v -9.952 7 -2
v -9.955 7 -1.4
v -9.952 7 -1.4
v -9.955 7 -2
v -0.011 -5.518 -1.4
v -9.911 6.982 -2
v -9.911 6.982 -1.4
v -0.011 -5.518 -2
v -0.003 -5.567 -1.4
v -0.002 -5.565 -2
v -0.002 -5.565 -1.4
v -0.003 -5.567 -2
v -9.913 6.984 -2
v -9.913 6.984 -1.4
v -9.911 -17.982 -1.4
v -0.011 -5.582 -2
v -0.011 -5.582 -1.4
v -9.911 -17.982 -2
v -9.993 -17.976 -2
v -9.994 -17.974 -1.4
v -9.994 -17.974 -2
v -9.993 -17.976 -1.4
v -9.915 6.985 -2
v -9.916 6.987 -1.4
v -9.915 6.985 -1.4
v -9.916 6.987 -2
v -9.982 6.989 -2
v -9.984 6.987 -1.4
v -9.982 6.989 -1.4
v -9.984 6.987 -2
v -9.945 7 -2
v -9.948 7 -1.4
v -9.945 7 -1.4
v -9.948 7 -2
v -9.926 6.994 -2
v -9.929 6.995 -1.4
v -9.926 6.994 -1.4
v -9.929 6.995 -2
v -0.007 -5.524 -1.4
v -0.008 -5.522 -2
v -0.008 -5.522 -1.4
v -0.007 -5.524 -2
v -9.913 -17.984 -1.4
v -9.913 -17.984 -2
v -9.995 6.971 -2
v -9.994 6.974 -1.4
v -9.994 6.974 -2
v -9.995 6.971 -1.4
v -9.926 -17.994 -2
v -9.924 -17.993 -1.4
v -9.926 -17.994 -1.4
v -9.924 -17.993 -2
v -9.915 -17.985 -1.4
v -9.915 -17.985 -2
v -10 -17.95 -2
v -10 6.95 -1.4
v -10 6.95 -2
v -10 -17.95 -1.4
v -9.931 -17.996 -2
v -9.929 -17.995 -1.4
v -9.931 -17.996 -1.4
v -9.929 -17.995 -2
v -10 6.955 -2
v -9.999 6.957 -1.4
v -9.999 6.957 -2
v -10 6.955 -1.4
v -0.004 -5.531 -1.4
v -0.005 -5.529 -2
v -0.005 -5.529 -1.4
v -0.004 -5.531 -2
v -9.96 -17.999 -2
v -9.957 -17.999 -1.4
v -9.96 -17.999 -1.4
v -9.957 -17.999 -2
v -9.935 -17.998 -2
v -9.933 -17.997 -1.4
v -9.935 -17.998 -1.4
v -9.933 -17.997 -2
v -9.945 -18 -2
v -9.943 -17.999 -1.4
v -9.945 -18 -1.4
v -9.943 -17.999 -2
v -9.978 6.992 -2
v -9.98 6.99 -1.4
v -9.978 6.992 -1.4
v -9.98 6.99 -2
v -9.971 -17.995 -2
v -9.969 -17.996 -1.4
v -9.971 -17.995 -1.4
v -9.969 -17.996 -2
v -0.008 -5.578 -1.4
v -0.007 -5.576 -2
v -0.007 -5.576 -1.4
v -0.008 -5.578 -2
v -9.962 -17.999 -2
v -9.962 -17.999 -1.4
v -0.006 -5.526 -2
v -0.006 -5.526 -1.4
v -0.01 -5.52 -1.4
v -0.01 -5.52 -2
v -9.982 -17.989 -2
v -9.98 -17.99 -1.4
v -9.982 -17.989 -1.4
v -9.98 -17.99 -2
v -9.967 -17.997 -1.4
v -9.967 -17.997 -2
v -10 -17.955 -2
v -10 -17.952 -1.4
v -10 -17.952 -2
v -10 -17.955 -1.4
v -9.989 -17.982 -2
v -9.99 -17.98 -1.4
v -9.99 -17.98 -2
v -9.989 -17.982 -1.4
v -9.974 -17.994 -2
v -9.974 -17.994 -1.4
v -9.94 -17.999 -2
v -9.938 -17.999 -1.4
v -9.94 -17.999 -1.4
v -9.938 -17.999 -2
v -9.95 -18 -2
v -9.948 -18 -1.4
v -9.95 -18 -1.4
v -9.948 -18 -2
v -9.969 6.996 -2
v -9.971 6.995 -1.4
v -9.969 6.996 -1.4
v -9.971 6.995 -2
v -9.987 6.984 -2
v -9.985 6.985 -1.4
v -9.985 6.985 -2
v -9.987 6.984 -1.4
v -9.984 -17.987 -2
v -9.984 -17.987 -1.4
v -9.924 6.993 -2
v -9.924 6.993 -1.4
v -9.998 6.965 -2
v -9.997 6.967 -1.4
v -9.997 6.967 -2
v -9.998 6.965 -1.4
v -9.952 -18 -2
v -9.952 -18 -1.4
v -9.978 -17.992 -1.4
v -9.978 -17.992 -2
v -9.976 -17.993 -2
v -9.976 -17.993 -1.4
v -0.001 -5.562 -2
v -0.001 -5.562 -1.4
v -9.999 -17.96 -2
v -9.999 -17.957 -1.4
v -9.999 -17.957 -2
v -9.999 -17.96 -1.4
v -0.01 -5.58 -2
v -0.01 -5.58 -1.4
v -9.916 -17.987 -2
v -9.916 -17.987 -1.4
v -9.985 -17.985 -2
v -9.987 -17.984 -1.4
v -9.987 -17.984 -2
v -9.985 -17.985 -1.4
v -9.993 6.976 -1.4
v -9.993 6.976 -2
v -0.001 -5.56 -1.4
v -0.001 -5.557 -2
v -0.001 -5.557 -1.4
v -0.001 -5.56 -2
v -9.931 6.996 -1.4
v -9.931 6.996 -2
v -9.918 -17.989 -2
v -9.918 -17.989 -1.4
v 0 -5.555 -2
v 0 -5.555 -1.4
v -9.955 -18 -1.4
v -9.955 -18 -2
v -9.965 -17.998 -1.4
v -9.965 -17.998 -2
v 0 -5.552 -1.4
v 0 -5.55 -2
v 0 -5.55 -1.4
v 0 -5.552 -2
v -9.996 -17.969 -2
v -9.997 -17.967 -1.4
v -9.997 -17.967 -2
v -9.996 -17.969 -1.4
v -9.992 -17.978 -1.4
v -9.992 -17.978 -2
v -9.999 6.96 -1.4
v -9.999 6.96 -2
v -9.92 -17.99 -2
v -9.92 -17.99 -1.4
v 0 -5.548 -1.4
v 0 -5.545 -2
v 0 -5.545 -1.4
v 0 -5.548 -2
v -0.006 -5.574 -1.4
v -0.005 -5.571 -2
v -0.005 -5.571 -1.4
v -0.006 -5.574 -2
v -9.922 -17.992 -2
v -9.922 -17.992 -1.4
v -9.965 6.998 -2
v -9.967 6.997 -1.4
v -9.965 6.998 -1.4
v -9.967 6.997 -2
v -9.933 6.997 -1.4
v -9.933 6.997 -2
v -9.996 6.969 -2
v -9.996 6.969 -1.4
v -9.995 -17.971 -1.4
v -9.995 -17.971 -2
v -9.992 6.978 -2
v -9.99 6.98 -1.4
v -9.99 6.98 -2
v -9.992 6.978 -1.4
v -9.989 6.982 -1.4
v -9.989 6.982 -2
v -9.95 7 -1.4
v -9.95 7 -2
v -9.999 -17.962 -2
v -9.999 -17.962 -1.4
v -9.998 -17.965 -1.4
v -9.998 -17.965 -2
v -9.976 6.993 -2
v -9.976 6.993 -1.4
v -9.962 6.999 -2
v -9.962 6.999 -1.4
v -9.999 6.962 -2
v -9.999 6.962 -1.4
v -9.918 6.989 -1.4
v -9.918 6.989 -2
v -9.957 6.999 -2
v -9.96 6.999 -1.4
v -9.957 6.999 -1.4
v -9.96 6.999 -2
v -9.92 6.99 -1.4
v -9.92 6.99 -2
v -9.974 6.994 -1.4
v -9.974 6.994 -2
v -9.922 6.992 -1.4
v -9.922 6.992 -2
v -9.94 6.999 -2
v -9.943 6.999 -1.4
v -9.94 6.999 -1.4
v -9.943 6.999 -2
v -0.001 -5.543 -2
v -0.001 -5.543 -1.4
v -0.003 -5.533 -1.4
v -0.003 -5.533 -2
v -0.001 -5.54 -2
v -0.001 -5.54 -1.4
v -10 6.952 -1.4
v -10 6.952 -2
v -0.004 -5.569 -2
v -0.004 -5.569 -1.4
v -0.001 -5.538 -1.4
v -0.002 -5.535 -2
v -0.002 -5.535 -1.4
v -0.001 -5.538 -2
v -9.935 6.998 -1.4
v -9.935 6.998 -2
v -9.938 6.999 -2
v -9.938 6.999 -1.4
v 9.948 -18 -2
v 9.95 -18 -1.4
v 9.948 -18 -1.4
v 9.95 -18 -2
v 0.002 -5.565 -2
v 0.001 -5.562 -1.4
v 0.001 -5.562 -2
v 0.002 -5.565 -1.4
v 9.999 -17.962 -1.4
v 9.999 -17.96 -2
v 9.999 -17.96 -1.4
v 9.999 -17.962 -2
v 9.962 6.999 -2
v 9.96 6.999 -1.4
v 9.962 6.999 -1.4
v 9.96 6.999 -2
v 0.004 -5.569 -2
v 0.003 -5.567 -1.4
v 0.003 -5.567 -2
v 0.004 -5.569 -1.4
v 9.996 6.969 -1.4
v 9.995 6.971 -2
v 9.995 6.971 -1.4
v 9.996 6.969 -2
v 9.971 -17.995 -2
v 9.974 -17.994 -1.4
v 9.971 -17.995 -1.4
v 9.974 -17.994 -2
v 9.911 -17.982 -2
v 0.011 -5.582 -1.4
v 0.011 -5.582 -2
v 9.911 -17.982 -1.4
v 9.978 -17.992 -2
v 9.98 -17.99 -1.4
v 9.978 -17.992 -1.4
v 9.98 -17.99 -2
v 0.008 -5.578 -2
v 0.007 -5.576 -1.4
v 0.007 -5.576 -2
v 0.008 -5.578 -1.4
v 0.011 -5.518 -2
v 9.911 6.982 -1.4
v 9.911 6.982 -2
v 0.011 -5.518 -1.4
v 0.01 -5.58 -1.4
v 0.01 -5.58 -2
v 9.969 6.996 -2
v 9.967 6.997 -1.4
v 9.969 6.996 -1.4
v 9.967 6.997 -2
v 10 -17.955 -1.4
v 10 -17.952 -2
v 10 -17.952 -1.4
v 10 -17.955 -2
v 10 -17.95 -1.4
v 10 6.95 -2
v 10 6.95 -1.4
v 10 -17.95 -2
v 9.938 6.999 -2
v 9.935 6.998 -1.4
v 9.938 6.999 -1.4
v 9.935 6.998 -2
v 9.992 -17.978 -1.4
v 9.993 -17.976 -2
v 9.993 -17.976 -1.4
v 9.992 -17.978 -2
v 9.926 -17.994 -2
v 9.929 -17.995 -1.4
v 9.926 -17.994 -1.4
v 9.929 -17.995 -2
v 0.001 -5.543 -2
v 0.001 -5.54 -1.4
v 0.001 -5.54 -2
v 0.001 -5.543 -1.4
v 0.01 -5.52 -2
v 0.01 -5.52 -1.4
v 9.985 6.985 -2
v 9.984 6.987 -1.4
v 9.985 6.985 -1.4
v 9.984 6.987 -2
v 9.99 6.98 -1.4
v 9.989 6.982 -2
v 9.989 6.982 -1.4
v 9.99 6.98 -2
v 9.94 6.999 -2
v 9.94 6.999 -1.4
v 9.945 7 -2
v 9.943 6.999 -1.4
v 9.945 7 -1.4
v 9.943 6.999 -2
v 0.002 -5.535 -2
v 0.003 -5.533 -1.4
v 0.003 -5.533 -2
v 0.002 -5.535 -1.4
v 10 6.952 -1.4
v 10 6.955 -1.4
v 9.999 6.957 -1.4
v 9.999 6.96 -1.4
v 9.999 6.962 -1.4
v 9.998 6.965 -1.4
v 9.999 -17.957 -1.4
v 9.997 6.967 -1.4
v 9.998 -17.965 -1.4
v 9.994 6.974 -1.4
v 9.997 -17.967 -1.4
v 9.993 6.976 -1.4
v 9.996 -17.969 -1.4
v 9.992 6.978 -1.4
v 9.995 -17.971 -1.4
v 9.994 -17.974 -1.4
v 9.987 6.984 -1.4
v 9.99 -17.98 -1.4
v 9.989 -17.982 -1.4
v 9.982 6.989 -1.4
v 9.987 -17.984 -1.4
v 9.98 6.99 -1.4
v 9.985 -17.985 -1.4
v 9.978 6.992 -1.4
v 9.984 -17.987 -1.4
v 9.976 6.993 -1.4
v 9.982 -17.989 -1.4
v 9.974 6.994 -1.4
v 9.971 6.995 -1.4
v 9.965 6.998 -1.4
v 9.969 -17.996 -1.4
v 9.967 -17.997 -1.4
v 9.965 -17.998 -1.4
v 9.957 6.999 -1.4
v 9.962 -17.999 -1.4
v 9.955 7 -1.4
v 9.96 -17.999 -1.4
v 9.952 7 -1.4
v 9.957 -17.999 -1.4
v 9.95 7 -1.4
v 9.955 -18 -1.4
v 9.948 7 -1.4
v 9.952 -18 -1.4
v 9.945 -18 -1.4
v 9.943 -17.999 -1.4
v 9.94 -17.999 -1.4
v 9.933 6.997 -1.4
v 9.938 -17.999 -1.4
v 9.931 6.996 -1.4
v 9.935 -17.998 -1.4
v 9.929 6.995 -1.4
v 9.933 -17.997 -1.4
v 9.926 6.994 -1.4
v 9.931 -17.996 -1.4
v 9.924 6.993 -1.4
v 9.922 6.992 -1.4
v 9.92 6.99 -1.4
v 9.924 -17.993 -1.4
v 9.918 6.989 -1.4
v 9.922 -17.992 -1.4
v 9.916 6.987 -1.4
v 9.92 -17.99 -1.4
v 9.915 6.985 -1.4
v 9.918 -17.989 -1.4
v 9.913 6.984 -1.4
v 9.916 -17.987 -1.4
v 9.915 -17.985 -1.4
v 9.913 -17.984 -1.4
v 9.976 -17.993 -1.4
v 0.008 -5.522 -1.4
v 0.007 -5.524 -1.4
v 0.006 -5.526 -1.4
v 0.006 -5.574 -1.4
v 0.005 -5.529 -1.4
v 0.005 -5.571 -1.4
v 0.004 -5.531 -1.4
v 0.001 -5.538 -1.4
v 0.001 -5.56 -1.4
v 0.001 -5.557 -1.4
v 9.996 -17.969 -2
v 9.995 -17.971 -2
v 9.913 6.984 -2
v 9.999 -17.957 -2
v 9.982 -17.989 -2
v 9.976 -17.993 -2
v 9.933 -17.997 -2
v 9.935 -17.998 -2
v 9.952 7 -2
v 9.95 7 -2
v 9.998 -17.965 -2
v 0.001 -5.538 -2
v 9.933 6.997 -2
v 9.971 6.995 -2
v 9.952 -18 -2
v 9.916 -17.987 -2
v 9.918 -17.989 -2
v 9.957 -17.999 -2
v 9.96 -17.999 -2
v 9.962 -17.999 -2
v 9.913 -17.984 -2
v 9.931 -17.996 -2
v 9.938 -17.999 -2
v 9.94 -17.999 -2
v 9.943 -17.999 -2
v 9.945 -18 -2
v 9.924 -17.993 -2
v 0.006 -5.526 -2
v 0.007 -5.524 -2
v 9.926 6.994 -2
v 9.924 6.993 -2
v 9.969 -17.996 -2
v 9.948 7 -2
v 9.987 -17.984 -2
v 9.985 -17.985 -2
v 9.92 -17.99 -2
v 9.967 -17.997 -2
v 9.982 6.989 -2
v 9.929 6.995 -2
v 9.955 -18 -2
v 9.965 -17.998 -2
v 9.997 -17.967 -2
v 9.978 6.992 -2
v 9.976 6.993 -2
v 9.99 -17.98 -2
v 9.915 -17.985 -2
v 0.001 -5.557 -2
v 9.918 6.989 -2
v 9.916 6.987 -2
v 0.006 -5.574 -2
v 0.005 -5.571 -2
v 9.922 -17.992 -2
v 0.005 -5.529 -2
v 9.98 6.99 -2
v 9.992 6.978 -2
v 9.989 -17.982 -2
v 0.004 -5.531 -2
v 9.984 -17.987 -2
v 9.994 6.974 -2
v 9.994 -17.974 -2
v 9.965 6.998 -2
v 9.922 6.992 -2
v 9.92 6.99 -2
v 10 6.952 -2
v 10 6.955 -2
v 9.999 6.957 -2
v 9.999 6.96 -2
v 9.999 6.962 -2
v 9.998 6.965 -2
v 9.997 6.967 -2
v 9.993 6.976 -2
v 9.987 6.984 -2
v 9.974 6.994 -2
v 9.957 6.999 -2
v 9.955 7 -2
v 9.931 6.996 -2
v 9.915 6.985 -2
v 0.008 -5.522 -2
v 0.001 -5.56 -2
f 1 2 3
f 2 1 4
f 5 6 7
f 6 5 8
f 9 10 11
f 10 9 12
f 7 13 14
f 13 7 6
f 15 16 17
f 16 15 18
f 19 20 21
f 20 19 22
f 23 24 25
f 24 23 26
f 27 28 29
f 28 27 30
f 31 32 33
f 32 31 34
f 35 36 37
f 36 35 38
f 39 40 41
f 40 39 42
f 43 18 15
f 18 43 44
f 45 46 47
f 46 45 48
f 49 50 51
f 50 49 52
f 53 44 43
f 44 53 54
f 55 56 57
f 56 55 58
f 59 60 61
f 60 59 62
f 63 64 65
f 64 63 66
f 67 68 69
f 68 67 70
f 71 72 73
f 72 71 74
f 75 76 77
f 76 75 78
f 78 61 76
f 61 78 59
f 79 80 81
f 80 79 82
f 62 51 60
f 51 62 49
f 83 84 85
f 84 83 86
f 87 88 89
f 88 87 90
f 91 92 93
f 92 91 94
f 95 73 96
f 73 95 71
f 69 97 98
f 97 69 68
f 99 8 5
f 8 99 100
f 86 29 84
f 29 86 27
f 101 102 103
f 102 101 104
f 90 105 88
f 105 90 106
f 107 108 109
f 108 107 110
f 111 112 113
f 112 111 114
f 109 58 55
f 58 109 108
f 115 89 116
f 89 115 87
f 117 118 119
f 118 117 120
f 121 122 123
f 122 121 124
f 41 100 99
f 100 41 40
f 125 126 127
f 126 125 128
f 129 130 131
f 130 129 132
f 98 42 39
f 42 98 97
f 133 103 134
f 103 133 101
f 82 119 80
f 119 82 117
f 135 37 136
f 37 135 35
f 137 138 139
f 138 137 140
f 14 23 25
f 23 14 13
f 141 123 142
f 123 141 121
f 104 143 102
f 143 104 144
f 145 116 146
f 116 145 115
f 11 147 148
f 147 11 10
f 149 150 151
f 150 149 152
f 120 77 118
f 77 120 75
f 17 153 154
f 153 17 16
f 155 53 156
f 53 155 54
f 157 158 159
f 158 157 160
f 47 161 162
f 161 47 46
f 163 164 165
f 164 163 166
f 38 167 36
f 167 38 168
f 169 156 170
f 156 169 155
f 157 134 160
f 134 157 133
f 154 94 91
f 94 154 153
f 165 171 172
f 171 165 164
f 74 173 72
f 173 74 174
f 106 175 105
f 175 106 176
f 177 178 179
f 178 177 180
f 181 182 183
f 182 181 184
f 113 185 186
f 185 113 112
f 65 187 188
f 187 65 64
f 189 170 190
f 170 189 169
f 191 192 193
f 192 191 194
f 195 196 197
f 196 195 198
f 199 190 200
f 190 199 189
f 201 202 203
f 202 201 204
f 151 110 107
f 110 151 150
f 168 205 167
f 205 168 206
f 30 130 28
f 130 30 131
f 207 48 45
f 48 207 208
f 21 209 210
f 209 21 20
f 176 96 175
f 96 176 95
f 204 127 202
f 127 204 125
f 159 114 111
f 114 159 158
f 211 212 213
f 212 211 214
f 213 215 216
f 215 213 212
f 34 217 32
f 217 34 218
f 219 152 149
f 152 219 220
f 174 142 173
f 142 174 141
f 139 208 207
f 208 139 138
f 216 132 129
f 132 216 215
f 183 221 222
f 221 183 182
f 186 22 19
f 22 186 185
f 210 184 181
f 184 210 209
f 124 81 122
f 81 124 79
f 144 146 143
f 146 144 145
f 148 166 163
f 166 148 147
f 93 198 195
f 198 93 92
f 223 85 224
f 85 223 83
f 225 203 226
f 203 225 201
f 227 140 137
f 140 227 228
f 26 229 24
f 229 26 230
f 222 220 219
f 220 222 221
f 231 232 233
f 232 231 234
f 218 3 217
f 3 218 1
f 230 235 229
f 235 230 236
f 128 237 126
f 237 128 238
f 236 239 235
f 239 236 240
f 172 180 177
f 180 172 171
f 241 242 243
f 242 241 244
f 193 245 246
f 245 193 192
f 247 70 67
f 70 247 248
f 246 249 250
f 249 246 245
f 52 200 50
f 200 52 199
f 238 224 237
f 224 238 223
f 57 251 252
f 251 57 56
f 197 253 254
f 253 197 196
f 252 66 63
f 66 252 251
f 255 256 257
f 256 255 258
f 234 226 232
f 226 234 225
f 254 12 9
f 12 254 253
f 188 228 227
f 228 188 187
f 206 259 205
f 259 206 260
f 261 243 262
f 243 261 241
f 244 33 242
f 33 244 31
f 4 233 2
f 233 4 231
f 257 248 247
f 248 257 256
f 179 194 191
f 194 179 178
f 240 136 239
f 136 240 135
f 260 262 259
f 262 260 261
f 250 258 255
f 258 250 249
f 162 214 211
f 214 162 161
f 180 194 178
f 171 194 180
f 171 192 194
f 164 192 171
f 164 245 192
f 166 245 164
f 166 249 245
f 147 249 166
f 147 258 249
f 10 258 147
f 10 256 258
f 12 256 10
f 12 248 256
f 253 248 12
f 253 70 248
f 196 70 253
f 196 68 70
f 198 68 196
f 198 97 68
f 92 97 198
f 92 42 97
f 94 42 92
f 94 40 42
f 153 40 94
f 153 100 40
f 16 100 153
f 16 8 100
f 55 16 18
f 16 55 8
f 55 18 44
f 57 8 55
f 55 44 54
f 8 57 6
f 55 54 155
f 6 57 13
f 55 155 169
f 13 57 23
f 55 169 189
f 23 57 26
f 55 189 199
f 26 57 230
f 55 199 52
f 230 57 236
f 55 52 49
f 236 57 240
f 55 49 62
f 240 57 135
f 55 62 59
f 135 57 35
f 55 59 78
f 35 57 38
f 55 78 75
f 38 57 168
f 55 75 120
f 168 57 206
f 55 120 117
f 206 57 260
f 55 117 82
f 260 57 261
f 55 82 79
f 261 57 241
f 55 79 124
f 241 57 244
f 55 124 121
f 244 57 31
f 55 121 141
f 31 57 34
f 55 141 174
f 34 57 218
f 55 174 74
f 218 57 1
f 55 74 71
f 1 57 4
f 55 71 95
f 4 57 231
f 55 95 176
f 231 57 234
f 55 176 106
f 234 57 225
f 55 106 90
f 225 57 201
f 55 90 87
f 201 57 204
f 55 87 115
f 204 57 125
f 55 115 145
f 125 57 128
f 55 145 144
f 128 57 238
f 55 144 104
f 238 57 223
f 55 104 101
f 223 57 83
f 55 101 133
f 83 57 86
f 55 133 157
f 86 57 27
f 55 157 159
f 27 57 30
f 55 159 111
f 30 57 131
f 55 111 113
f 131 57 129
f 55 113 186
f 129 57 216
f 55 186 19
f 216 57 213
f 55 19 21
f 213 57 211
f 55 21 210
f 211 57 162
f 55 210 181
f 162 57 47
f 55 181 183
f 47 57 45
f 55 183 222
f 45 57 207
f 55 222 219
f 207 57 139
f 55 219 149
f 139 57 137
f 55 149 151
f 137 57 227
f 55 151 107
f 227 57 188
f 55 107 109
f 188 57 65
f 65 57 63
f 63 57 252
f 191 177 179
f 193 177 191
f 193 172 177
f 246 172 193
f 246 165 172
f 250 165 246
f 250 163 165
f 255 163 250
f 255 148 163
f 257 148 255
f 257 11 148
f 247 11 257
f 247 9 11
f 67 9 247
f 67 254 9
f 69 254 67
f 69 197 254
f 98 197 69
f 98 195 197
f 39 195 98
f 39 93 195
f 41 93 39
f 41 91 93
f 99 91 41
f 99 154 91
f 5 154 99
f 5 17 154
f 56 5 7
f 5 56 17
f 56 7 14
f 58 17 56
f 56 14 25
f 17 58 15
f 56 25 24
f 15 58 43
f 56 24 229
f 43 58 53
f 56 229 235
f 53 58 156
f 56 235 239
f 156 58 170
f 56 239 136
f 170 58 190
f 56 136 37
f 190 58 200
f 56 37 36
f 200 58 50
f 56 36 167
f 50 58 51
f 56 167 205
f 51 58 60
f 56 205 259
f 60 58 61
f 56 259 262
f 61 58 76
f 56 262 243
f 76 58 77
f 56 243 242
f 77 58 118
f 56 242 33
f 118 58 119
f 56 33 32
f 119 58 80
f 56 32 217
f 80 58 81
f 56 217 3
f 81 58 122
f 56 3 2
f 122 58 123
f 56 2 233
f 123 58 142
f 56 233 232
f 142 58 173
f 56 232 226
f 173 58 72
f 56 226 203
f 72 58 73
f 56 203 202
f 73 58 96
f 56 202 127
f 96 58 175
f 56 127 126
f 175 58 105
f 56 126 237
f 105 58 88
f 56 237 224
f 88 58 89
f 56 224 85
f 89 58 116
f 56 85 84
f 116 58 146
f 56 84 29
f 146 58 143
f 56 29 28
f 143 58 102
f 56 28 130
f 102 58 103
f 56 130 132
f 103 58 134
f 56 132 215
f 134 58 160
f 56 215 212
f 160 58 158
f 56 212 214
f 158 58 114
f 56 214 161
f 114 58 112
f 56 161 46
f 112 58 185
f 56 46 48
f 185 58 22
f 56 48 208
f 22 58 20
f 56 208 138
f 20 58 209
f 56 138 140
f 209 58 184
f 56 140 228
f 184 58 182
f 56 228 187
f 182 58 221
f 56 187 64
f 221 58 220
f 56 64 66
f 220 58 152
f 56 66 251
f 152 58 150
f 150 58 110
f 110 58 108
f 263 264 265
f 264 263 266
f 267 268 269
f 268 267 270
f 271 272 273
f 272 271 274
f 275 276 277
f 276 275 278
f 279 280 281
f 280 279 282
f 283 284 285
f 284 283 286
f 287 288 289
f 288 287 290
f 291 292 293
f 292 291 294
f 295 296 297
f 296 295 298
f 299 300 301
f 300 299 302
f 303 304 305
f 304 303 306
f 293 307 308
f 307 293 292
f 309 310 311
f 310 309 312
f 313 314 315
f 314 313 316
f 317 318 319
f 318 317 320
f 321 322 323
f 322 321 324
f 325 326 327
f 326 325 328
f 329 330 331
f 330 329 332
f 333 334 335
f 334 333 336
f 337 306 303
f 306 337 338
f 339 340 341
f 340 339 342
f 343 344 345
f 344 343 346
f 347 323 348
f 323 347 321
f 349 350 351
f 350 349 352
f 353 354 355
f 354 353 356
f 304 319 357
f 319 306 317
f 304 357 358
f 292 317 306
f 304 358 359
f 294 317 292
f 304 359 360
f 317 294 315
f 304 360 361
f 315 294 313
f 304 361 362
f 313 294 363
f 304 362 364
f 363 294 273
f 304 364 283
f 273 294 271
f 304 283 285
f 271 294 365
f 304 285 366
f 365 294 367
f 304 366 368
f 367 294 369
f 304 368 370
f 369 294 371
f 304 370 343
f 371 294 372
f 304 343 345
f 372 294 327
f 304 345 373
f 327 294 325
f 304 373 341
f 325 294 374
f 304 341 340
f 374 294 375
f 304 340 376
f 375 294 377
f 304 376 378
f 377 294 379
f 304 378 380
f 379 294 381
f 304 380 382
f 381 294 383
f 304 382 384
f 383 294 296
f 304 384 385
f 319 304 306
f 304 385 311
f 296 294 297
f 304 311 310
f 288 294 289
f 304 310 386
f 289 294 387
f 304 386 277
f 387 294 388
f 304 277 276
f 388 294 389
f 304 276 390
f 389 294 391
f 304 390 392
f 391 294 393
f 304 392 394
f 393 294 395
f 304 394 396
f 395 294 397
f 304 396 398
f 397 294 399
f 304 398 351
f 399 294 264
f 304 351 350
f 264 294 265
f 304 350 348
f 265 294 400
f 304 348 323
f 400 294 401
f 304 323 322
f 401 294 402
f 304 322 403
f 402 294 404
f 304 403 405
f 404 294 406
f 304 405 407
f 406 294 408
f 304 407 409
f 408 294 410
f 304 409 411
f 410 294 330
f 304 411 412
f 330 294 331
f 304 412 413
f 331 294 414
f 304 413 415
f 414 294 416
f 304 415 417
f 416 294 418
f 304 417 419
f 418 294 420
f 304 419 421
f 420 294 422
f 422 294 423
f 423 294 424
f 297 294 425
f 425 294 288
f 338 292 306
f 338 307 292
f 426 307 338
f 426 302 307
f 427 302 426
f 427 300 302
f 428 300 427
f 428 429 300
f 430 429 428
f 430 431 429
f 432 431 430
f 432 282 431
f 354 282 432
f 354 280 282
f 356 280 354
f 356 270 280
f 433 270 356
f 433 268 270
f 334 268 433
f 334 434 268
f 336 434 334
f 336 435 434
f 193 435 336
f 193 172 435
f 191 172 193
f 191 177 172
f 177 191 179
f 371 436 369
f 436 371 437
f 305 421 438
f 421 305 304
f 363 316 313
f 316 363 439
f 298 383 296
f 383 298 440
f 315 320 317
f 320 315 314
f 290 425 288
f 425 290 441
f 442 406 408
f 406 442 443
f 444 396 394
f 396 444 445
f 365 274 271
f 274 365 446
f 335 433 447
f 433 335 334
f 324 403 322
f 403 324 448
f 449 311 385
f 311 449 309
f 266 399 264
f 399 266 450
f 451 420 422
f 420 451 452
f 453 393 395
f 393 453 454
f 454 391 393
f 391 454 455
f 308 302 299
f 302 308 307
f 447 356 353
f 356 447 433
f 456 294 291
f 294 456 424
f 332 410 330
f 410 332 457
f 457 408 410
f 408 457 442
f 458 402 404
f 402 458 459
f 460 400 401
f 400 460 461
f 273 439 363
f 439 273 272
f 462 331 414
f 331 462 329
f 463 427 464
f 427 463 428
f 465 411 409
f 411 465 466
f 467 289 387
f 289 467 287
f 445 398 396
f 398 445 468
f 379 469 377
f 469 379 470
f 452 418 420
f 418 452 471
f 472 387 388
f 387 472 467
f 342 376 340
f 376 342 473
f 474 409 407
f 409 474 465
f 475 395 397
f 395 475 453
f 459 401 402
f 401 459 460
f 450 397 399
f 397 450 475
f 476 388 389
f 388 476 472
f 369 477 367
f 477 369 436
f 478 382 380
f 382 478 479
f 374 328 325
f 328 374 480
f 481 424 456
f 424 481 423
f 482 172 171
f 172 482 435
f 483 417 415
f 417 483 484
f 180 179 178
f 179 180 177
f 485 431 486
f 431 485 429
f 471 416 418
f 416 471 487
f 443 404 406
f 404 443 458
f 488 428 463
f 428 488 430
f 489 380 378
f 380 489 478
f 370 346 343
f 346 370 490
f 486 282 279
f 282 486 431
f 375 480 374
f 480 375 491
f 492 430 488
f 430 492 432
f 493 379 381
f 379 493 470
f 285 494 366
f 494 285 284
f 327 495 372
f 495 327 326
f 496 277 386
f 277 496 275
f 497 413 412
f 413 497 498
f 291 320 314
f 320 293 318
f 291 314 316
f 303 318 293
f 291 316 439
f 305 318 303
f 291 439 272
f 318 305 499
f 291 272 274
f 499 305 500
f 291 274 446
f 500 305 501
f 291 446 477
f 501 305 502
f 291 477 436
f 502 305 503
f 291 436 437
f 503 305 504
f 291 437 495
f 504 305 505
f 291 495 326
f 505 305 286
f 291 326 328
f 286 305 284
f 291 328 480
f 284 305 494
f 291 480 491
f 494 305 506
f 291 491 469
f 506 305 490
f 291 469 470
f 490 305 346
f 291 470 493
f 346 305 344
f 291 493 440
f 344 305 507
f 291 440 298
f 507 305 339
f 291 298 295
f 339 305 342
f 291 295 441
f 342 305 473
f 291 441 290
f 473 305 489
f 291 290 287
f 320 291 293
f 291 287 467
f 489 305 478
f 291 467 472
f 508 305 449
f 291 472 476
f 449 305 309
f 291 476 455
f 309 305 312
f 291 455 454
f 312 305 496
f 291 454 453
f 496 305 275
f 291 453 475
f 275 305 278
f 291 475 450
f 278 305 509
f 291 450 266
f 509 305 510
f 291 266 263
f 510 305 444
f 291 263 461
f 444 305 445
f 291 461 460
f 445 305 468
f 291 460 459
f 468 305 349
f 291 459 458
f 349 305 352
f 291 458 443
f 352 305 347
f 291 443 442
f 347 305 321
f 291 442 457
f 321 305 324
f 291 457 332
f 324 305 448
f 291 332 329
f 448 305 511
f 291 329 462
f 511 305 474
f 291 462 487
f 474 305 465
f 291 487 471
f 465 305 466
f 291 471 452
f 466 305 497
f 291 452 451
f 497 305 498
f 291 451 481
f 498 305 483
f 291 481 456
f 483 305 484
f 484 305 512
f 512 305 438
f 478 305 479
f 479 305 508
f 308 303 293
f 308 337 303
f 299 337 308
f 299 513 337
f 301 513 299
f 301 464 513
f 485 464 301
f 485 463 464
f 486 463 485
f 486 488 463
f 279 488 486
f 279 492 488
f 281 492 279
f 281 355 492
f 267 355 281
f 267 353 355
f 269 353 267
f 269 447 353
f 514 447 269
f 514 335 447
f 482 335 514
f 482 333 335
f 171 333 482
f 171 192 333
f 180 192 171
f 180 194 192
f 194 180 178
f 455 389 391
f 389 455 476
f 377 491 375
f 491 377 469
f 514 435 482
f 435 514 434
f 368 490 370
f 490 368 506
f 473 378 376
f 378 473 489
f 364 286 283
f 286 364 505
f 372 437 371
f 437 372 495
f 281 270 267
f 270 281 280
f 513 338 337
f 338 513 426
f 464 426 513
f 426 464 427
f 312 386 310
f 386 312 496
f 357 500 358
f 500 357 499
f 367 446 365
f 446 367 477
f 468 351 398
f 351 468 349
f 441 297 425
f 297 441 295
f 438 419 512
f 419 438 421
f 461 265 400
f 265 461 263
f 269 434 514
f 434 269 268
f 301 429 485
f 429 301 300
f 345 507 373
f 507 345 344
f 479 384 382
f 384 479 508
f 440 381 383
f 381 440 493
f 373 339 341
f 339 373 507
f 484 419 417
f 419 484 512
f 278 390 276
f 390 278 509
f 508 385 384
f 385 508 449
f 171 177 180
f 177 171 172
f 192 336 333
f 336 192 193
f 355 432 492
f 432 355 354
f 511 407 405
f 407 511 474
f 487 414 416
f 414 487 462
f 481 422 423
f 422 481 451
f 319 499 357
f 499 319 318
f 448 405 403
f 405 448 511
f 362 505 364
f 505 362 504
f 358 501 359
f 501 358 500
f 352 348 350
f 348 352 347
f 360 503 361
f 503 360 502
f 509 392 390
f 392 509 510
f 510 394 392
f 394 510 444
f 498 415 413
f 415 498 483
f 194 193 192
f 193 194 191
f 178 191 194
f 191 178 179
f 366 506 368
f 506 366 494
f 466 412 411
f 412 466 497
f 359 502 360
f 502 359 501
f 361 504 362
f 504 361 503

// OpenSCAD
// file: ../parts/train_integrity_body.scad
/* RailEduKit/InteractiveSignallingLaboratory © 2025 by Martin Scheidt and contributors
 * License: CC-BY 4.0 - https://creativecommons.org/licenses/by/4.0/
 * Project description: The Interactive Signalling Laboratory is a tool for training in Rail
 * Applications to enhance the knowledge of control and signalling principles for rail transport systems.
 *
 * Module: train_integrity_body
 */

// Include configuration file
include <../config/global_variables.scad>
include <../config/colors.scad>

thinnest_layer     = 0.2;

coupling_radius    = 13/2;
coupling_depth     = 8;
coupling_cut_pos   = coupling_radius*1/2;
boogie_width       = 20;
coupler_thickness  = 1.5;
lipp_height        = 4;
lipp_width         = coupler_thickness - move_tolerance;
shield_width       = 20;
shield_depth       = 25;
inlay_thickness    = 0.45;
shield_thickness   = 2; // the shield has to be at least 2mm thick. Otherwise the front symbol will be printed badly
inlay_radius       = 10.5/2;

symbol_height 	   = 0.6;

module train_integrity_body() {
	color(BASE_COLOR) union(){
	difference() { // coupling
		// outer ring
		cylinder(h = coupling_depth, r = coupling_radius + move_tolerance / 2 + coupler_thickness);
		// inner ring
		translate([ 0, 0, -coupler_thickness / 2 ])
		cylinder(h = coupling_depth + coupler_thickness, r = coupling_radius + move_tolerance / 2);
		// cutting the lower edge
		translate([ -coupling_radius * 1.3, coupling_cut_pos, -coupler_thickness / 2 ])
		cube([ coupling_radius * 2.6, coupling_radius * 1.2, coupling_depth + coupler_thickness ]);
	}

	union() { // upper board
		// beam
		translate([ -boogie_width / 2, -(coupling_radius + coupler_thickness + move_tolerance / 2), 0 ])
		cube([ boogie_width, coupler_thickness, coupling_depth ]);
		// lipp
		hull() {
			translate([
				-boogie_width / 2, -(coupling_radius + move_tolerance / 2 + coupler_thickness - lipp_width),
				coupling_depth
			])
			cube([ boogie_width, thinnest_layer, lipp_height / 4 ]);
			translate(
			    [ -boogie_width / 2, -(coupling_radius + move_tolerance / 2 + coupler_thickness), coupling_depth ])
			cube([ boogie_width, thinnest_layer, lipp_height ]);
		}
	}

	difference() { // front shield
		translate([ -shield_width / 2, -(shield_depth) / 2 - coupling_radius + 1, -shield_thickness ]) 
		cube([ shield_width, shield_depth, shield_thickness ]);
		translate([ 0, 0, -inlay_thickness ])
		cylinder(h = inlay_thickness, r = inlay_radius);
	}
	}
}

//train_integrity_body();
// file: ../config/colors.scad
/* RailEduKit/InteractiveSignallingLaboratory © 2025 by Martin Scheidt and contributors
 * License: CC-BY 4.0 - https://creativecommons.org/licenses/by/4.0/
 * Project description: The Interactive Signalling Laboratory is a tool for training in Rail
 * Applications to enhance the knowledge of control and signalling principles for rail transport systems.
 *
 * Module: config/colors.scad
 */

// component colors
BASE_COLOR = "black";
INDICATOR_COLOR = "white";
ROUTE_COLOR = "blue";

// signal colors
ASPECT_CLEAR = "green";
ASPECT_APPROACH = "yellow";
ASPECT_STOP = "red";
// file: ../config/global_variables.scad
/* RailEduKit/InteractiveSignallingLaboratory © 2025 by Martin Scheidt and contributors
 * License: CC-BY 4.0 - https://creativecommons.org/licenses/by/4.0/
 * Project description: The Interactive Signalling Laboratory is a tool for training in Rail
 * Applications to enhance the knowledge of control and signalling principles for rail transport systems.
 *
 * Module: config/global_variables.scad
 */

/* 
++++++++++++++++++++++++ Start of New Structure +++++++++++++++++++++++++++++++++++

the structure should orientate on the file structure
but some variables have to stand on the top of the structure


 */

{// assemblies
    {// balise
            
    }
    {// checkbox_route
        
    }
    {// clearing_point_block

    }
    {// clearing_point_route

    }
    {// direction_management_box

    }
    {// direction_management_lever

    }
    {// locking_pin

    }
    {// overlap_measure

    }
    {// position_indicator_number

    }
    {
        
    }
}
{// jigs


}









/* 
++++++++++++++++++++++++ End of New Structure +++++++++++++++++++++++++++++++++++
 */

/*************** resolution ***************/
// number of fragments; default 0;
//When this variable has a value greater than zero, the two variables $fa and $fs are ignored
$fn = $preview ? 32 : 128;

// $fa = 12;// minimum angle for a fragment; default 12; minimum allowed value is 0.01
// $fs = 2;// minimum size of a fragment; default 2; minimum allowed value is 0.01

/*****
To have the dimensions of all components at one place
*******/

/*******
TODO
- standard on which part the move tolerance is substracted?
******/
// ATTENTION: Note the general move_tolerance of 0.5

move_tolerance = 0.5;

nozzle_diameter = 0.4;

{/***************wood rail specification***************/
    // rail instead of wood to prevent duplicate variables with tracklib.scad file
    rail_height = 12;
    rail_width = 40;
    rail_thickness_track = 6;
    rail_well_height = 9; // copy from tracklib
    rail_well_width = 5.7; // copy from tracklib
    rail_well_spacing = 19.25; // copy from tracklib
    rail_groove_depth = rail_height - rail_well_height;

    straight_length = 144;

    curve_inner_radius = 180; // 182; // inner radius
    curve_middle_radius = curve_inner_radius+rail_width/2;
    curve_outer_radius = curve_inner_radius+rail_width;
    curve_angle = 45.7; // degree
    curve_length_middle_radius = (2*PI*curve_middle_radius*curve_angle)/360;
}
{/***************magnet specifications***************/

}
{/***************engraving specifications***************/
    engraving_height = 2;//(block_height-handle_height)/2;
    engraving_thickness = 1.5;
    
  
    fine_line = 0.2;
    thin_line = 0.8;
    regular_line = 1;
}



{/***************basis_component-roundedBox***************/
    body_width = 30;
    body_depth = 50;
    body_height = 13.5; 
    track_arc_inner_radius = 182;
    sagitta = 0.43; //DE: Pfeilhöhe -> 25mm Straighten round edge in the middle
}


{/***************overlap_measure***************/    
}

{/***************straight***************/
    //straight = s
    // pin hole 1 = ph1
    s_ph_xpos = rail_width/2;
    s_ph1_ypos = 30;
    s_ph2_ypos = straight_length/2;
    s_ph3_ypos = straight_length-s_ph1_ypos;
    
    // magnet hole = mh
    s_mh_xpos = rail_width;
    s_mh_zpos = rail_height/2;
    s_mh_ypos1 = 7.5;
    s_mh_ypos2 = straight_length-s_mh_ypos1;
    
    
}

{/***************curve***************/
    

    // curve = c
    // pin hole 1 = ph1
    c_alpha = (s_ph1_ypos * 360)/(2*PI*curve_middle_radius);
    c_ph1_ypos = sin(c_alpha) * curve_middle_radius;
    c_ph1_xpos = curve_outer_radius - cos(c_alpha) * curve_middle_radius;
    // pin hole 2 = ph2
    c_beta = curve_angle/2;
    c_ph2_ypos = sin(c_beta) * curve_middle_radius;
    c_ph2_xpos = curve_outer_radius - cos(c_beta) * curve_middle_radius;
    // pin hole 3 = ph3
    c_gamma = curve_angle - c_alpha;
    c_ph3_ypos = sin(c_gamma) * curve_middle_radius;
    c_ph3_xpos = curve_outer_radius - cos(c_gamma) * curve_middle_radius;

    // echo("  ");
    // echo("c_ph1_ypos", c_ph1_ypos);
    // echo("c_ph1_xpos", c_ph1_xpos);
    // echo("  ");
    // echo("c_ph2_ypos", c_ph2_ypos);
    // echo("c_ph2_xpos", c_ph2_xpos);
    // echo("  ");
    // echo("c_ph3_ypos", c_ph3_ypos);
    // echo("c_ph3_xpos", c_ph3_xpos);
    // echo("  ");

    c_mh_zpos = rail_height/2;
    // magnet hole 4 = mh1
    c_mh4_xpos = 0.1;
    c_mh4_ypos = 7.7;
    c_mh4_zrot = -2;
    // magnet hole 5 = mh1
    c_mh5_xpos = 40.3;
    c_mh5_ypos = 7.5;
    c_mh5_zrot = -2.4;
    // magnet hole 6 = mh1
    c_mh6_xpos = 61;
    c_mh6_ypos = 152;
    c_mh6_zrot = -43.7;
    // magnet hole 7 = mh1
    c_mh7_xpos = 89.05;
    c_mh7_ypos = 123.35;
    c_mh7_zrot = -43.3;
    
}



{/***************switch_blade***************/

}
{/***************switch_body***************/

}

{/***************locking_pin***************/
    
}
{/***************distant and block signal***************/
}

{/***************drill_template_straight***************/
    drill_move_tolerance = 0.3;
    // drill straight ground
    dsg_thickness = 5;
    dsg_hole_depth = 5;
    // drill straight cutout = dsc
    dsc_connector_width = 15;
    dsc_connector_height = 15;
    dsc_y_pos = 12;
    dsc_depth = rail_height+drill_move_tolerance;

    dsc_connector_z_pos = dsg_thickness+12;
    dsc_supporting_surface_width = 50;

    // drill straight hole
    dsh_y_pos = dsc_depth/2;
    dsh_x_pos = 7.5;

    // drill straigth base = dsb
    dsb_depth = 2*dsc_y_pos+dsc_depth;
    dsb_height = dsg_thickness+rail_width;//27;
}

{/***************drill_template_curve***************/
    // drill template curve = dtc
    dtc_cutout_middle_angle = 45+5;

    dtc_cutout_z_pos = 12;
    dtc_cutout_height = dsc_depth;
    dtc_outer_radius = curve_inner_radius+rail_width;
    dtc_side_radius = curve_inner_radius + 28;
    dtc_middle_radius = curve_inner_radius + 12;
    dtc_inner_radius = curve_inner_radius;

    dtc_height = 2*dtc_cutout_z_pos+dtc_cutout_height;

    // drill template curve hole
    dtch_z_pos = dsc_depth/2;
    dtch_y_pos = 7.5;

    dtc_switch_hole_y_pos = straight_length-dtch_y_pos;
    
    // horizontal template = ht
    origin_shift = 10;
    ht_scope = 0.1;
    ht_male_connector_angle = 1.8; //6mm
    ht_height = rail_height/2;
    ht_beta = curve_angle+ht_male_connector_angle;
    male_connector_space_xpos = (curve_outer_radius)-cos(ht_beta)*curve_middle_radius;
    male_connector_space_ypos = sin(ht_beta)*curve_middle_radius;
    
    grip_hole_left_xpos = (curve_outer_radius)-cos(ht_beta/2)*curve_outer_radius;
    grip_hole_left_ypos = sin(ht_beta/2)*curve_outer_radius;
    grip_hole_right_xpos = (curve_outer_radius)-cos(ht_beta/2)*curve_inner_radius;
    grip_hole_right_ypos = sin(ht_beta/2)*curve_inner_radius;
}
{/***************drill_template_switch***************/
    // all needed values in "drill_template_curve" and "drill_template_straight"
}

{/***************magnet_rod***************/

    
}



{/***************direction_management***************/
}

{/***************number_plate***************/

}

{/***************balise***************/
}

{/***************train integrity***************/
}

{/***************switch locker***************/

}

{/***************route_indicator_straight***************/
    
}

{/***************route_indicator_curve***************/
    
}
// main file
/* RailEduKit/InteractiveSignallingLaboratory © 2025 by Martin Scheidt and contributors
 * License: CC-BY 4.0 - https://creativecommons.org/licenses/by/4.0/
 * Project description: The Interactive Signalling Laboratory is a tool for training in Rail
 * Applications to enhance the knowledge of control and signalling principles for rail transport systems.
 *
 * Module: train_integrity_symbol_rear
 */

// Include configuration file
include <../config/global_variables.scad>
include <../config/colors.scad>

// include common parts
include <../parts/train_integrity_body.scad> // access variables

/* PRINT INSTRUCTION
To print the train integrity you have to export the symbol and the body seperately as STL.
Then you have to select the body STL and the symbol STL and load them TOGETHER at the same time in Bambu Studio.
Thus the two files are positioned at the same place and the symbol fills the holes in the body perfectly.
Then you can select the two parts seperately to color them.
Through this procedure you can print multiple colors in one layer.
 */


module triangle() {
	cylinder_diameter = 0.1;
	hull() {
		translate([ cylinder_diameter / 2, cylinder_diameter / 2, 0 ])
		cylinder(d = cylinder_diameter, h = symbol_height);
		translate([ cylinder_diameter / 2, shield_depth - cylinder_diameter / 2, 0 ])
		cylinder(d = cylinder_diameter, h = symbol_height);
		translate([ (shield_width - cylinder_diameter) / 2, (shield_depth - cylinder_diameter) / 2, 0 ])
		cylinder(d = cylinder_diameter, h = symbol_height);
	}
}

module train_integrity_symbol_rear() {
	color(ASPECT_STOP) union(){
		translate([ -shield_width / 2, -(shield_depth) / 2 - coupling_radius + 1, -shield_thickness ])
		triangle();
		translate([ shield_width / 2, -(shield_depth) / 2 - coupling_radius + 1, -shield_thickness + symbol_height ])
		rotate([ 0, 180, 0 ])
		triangle();
	}
	
}

train_integrity_symbol_rear();
